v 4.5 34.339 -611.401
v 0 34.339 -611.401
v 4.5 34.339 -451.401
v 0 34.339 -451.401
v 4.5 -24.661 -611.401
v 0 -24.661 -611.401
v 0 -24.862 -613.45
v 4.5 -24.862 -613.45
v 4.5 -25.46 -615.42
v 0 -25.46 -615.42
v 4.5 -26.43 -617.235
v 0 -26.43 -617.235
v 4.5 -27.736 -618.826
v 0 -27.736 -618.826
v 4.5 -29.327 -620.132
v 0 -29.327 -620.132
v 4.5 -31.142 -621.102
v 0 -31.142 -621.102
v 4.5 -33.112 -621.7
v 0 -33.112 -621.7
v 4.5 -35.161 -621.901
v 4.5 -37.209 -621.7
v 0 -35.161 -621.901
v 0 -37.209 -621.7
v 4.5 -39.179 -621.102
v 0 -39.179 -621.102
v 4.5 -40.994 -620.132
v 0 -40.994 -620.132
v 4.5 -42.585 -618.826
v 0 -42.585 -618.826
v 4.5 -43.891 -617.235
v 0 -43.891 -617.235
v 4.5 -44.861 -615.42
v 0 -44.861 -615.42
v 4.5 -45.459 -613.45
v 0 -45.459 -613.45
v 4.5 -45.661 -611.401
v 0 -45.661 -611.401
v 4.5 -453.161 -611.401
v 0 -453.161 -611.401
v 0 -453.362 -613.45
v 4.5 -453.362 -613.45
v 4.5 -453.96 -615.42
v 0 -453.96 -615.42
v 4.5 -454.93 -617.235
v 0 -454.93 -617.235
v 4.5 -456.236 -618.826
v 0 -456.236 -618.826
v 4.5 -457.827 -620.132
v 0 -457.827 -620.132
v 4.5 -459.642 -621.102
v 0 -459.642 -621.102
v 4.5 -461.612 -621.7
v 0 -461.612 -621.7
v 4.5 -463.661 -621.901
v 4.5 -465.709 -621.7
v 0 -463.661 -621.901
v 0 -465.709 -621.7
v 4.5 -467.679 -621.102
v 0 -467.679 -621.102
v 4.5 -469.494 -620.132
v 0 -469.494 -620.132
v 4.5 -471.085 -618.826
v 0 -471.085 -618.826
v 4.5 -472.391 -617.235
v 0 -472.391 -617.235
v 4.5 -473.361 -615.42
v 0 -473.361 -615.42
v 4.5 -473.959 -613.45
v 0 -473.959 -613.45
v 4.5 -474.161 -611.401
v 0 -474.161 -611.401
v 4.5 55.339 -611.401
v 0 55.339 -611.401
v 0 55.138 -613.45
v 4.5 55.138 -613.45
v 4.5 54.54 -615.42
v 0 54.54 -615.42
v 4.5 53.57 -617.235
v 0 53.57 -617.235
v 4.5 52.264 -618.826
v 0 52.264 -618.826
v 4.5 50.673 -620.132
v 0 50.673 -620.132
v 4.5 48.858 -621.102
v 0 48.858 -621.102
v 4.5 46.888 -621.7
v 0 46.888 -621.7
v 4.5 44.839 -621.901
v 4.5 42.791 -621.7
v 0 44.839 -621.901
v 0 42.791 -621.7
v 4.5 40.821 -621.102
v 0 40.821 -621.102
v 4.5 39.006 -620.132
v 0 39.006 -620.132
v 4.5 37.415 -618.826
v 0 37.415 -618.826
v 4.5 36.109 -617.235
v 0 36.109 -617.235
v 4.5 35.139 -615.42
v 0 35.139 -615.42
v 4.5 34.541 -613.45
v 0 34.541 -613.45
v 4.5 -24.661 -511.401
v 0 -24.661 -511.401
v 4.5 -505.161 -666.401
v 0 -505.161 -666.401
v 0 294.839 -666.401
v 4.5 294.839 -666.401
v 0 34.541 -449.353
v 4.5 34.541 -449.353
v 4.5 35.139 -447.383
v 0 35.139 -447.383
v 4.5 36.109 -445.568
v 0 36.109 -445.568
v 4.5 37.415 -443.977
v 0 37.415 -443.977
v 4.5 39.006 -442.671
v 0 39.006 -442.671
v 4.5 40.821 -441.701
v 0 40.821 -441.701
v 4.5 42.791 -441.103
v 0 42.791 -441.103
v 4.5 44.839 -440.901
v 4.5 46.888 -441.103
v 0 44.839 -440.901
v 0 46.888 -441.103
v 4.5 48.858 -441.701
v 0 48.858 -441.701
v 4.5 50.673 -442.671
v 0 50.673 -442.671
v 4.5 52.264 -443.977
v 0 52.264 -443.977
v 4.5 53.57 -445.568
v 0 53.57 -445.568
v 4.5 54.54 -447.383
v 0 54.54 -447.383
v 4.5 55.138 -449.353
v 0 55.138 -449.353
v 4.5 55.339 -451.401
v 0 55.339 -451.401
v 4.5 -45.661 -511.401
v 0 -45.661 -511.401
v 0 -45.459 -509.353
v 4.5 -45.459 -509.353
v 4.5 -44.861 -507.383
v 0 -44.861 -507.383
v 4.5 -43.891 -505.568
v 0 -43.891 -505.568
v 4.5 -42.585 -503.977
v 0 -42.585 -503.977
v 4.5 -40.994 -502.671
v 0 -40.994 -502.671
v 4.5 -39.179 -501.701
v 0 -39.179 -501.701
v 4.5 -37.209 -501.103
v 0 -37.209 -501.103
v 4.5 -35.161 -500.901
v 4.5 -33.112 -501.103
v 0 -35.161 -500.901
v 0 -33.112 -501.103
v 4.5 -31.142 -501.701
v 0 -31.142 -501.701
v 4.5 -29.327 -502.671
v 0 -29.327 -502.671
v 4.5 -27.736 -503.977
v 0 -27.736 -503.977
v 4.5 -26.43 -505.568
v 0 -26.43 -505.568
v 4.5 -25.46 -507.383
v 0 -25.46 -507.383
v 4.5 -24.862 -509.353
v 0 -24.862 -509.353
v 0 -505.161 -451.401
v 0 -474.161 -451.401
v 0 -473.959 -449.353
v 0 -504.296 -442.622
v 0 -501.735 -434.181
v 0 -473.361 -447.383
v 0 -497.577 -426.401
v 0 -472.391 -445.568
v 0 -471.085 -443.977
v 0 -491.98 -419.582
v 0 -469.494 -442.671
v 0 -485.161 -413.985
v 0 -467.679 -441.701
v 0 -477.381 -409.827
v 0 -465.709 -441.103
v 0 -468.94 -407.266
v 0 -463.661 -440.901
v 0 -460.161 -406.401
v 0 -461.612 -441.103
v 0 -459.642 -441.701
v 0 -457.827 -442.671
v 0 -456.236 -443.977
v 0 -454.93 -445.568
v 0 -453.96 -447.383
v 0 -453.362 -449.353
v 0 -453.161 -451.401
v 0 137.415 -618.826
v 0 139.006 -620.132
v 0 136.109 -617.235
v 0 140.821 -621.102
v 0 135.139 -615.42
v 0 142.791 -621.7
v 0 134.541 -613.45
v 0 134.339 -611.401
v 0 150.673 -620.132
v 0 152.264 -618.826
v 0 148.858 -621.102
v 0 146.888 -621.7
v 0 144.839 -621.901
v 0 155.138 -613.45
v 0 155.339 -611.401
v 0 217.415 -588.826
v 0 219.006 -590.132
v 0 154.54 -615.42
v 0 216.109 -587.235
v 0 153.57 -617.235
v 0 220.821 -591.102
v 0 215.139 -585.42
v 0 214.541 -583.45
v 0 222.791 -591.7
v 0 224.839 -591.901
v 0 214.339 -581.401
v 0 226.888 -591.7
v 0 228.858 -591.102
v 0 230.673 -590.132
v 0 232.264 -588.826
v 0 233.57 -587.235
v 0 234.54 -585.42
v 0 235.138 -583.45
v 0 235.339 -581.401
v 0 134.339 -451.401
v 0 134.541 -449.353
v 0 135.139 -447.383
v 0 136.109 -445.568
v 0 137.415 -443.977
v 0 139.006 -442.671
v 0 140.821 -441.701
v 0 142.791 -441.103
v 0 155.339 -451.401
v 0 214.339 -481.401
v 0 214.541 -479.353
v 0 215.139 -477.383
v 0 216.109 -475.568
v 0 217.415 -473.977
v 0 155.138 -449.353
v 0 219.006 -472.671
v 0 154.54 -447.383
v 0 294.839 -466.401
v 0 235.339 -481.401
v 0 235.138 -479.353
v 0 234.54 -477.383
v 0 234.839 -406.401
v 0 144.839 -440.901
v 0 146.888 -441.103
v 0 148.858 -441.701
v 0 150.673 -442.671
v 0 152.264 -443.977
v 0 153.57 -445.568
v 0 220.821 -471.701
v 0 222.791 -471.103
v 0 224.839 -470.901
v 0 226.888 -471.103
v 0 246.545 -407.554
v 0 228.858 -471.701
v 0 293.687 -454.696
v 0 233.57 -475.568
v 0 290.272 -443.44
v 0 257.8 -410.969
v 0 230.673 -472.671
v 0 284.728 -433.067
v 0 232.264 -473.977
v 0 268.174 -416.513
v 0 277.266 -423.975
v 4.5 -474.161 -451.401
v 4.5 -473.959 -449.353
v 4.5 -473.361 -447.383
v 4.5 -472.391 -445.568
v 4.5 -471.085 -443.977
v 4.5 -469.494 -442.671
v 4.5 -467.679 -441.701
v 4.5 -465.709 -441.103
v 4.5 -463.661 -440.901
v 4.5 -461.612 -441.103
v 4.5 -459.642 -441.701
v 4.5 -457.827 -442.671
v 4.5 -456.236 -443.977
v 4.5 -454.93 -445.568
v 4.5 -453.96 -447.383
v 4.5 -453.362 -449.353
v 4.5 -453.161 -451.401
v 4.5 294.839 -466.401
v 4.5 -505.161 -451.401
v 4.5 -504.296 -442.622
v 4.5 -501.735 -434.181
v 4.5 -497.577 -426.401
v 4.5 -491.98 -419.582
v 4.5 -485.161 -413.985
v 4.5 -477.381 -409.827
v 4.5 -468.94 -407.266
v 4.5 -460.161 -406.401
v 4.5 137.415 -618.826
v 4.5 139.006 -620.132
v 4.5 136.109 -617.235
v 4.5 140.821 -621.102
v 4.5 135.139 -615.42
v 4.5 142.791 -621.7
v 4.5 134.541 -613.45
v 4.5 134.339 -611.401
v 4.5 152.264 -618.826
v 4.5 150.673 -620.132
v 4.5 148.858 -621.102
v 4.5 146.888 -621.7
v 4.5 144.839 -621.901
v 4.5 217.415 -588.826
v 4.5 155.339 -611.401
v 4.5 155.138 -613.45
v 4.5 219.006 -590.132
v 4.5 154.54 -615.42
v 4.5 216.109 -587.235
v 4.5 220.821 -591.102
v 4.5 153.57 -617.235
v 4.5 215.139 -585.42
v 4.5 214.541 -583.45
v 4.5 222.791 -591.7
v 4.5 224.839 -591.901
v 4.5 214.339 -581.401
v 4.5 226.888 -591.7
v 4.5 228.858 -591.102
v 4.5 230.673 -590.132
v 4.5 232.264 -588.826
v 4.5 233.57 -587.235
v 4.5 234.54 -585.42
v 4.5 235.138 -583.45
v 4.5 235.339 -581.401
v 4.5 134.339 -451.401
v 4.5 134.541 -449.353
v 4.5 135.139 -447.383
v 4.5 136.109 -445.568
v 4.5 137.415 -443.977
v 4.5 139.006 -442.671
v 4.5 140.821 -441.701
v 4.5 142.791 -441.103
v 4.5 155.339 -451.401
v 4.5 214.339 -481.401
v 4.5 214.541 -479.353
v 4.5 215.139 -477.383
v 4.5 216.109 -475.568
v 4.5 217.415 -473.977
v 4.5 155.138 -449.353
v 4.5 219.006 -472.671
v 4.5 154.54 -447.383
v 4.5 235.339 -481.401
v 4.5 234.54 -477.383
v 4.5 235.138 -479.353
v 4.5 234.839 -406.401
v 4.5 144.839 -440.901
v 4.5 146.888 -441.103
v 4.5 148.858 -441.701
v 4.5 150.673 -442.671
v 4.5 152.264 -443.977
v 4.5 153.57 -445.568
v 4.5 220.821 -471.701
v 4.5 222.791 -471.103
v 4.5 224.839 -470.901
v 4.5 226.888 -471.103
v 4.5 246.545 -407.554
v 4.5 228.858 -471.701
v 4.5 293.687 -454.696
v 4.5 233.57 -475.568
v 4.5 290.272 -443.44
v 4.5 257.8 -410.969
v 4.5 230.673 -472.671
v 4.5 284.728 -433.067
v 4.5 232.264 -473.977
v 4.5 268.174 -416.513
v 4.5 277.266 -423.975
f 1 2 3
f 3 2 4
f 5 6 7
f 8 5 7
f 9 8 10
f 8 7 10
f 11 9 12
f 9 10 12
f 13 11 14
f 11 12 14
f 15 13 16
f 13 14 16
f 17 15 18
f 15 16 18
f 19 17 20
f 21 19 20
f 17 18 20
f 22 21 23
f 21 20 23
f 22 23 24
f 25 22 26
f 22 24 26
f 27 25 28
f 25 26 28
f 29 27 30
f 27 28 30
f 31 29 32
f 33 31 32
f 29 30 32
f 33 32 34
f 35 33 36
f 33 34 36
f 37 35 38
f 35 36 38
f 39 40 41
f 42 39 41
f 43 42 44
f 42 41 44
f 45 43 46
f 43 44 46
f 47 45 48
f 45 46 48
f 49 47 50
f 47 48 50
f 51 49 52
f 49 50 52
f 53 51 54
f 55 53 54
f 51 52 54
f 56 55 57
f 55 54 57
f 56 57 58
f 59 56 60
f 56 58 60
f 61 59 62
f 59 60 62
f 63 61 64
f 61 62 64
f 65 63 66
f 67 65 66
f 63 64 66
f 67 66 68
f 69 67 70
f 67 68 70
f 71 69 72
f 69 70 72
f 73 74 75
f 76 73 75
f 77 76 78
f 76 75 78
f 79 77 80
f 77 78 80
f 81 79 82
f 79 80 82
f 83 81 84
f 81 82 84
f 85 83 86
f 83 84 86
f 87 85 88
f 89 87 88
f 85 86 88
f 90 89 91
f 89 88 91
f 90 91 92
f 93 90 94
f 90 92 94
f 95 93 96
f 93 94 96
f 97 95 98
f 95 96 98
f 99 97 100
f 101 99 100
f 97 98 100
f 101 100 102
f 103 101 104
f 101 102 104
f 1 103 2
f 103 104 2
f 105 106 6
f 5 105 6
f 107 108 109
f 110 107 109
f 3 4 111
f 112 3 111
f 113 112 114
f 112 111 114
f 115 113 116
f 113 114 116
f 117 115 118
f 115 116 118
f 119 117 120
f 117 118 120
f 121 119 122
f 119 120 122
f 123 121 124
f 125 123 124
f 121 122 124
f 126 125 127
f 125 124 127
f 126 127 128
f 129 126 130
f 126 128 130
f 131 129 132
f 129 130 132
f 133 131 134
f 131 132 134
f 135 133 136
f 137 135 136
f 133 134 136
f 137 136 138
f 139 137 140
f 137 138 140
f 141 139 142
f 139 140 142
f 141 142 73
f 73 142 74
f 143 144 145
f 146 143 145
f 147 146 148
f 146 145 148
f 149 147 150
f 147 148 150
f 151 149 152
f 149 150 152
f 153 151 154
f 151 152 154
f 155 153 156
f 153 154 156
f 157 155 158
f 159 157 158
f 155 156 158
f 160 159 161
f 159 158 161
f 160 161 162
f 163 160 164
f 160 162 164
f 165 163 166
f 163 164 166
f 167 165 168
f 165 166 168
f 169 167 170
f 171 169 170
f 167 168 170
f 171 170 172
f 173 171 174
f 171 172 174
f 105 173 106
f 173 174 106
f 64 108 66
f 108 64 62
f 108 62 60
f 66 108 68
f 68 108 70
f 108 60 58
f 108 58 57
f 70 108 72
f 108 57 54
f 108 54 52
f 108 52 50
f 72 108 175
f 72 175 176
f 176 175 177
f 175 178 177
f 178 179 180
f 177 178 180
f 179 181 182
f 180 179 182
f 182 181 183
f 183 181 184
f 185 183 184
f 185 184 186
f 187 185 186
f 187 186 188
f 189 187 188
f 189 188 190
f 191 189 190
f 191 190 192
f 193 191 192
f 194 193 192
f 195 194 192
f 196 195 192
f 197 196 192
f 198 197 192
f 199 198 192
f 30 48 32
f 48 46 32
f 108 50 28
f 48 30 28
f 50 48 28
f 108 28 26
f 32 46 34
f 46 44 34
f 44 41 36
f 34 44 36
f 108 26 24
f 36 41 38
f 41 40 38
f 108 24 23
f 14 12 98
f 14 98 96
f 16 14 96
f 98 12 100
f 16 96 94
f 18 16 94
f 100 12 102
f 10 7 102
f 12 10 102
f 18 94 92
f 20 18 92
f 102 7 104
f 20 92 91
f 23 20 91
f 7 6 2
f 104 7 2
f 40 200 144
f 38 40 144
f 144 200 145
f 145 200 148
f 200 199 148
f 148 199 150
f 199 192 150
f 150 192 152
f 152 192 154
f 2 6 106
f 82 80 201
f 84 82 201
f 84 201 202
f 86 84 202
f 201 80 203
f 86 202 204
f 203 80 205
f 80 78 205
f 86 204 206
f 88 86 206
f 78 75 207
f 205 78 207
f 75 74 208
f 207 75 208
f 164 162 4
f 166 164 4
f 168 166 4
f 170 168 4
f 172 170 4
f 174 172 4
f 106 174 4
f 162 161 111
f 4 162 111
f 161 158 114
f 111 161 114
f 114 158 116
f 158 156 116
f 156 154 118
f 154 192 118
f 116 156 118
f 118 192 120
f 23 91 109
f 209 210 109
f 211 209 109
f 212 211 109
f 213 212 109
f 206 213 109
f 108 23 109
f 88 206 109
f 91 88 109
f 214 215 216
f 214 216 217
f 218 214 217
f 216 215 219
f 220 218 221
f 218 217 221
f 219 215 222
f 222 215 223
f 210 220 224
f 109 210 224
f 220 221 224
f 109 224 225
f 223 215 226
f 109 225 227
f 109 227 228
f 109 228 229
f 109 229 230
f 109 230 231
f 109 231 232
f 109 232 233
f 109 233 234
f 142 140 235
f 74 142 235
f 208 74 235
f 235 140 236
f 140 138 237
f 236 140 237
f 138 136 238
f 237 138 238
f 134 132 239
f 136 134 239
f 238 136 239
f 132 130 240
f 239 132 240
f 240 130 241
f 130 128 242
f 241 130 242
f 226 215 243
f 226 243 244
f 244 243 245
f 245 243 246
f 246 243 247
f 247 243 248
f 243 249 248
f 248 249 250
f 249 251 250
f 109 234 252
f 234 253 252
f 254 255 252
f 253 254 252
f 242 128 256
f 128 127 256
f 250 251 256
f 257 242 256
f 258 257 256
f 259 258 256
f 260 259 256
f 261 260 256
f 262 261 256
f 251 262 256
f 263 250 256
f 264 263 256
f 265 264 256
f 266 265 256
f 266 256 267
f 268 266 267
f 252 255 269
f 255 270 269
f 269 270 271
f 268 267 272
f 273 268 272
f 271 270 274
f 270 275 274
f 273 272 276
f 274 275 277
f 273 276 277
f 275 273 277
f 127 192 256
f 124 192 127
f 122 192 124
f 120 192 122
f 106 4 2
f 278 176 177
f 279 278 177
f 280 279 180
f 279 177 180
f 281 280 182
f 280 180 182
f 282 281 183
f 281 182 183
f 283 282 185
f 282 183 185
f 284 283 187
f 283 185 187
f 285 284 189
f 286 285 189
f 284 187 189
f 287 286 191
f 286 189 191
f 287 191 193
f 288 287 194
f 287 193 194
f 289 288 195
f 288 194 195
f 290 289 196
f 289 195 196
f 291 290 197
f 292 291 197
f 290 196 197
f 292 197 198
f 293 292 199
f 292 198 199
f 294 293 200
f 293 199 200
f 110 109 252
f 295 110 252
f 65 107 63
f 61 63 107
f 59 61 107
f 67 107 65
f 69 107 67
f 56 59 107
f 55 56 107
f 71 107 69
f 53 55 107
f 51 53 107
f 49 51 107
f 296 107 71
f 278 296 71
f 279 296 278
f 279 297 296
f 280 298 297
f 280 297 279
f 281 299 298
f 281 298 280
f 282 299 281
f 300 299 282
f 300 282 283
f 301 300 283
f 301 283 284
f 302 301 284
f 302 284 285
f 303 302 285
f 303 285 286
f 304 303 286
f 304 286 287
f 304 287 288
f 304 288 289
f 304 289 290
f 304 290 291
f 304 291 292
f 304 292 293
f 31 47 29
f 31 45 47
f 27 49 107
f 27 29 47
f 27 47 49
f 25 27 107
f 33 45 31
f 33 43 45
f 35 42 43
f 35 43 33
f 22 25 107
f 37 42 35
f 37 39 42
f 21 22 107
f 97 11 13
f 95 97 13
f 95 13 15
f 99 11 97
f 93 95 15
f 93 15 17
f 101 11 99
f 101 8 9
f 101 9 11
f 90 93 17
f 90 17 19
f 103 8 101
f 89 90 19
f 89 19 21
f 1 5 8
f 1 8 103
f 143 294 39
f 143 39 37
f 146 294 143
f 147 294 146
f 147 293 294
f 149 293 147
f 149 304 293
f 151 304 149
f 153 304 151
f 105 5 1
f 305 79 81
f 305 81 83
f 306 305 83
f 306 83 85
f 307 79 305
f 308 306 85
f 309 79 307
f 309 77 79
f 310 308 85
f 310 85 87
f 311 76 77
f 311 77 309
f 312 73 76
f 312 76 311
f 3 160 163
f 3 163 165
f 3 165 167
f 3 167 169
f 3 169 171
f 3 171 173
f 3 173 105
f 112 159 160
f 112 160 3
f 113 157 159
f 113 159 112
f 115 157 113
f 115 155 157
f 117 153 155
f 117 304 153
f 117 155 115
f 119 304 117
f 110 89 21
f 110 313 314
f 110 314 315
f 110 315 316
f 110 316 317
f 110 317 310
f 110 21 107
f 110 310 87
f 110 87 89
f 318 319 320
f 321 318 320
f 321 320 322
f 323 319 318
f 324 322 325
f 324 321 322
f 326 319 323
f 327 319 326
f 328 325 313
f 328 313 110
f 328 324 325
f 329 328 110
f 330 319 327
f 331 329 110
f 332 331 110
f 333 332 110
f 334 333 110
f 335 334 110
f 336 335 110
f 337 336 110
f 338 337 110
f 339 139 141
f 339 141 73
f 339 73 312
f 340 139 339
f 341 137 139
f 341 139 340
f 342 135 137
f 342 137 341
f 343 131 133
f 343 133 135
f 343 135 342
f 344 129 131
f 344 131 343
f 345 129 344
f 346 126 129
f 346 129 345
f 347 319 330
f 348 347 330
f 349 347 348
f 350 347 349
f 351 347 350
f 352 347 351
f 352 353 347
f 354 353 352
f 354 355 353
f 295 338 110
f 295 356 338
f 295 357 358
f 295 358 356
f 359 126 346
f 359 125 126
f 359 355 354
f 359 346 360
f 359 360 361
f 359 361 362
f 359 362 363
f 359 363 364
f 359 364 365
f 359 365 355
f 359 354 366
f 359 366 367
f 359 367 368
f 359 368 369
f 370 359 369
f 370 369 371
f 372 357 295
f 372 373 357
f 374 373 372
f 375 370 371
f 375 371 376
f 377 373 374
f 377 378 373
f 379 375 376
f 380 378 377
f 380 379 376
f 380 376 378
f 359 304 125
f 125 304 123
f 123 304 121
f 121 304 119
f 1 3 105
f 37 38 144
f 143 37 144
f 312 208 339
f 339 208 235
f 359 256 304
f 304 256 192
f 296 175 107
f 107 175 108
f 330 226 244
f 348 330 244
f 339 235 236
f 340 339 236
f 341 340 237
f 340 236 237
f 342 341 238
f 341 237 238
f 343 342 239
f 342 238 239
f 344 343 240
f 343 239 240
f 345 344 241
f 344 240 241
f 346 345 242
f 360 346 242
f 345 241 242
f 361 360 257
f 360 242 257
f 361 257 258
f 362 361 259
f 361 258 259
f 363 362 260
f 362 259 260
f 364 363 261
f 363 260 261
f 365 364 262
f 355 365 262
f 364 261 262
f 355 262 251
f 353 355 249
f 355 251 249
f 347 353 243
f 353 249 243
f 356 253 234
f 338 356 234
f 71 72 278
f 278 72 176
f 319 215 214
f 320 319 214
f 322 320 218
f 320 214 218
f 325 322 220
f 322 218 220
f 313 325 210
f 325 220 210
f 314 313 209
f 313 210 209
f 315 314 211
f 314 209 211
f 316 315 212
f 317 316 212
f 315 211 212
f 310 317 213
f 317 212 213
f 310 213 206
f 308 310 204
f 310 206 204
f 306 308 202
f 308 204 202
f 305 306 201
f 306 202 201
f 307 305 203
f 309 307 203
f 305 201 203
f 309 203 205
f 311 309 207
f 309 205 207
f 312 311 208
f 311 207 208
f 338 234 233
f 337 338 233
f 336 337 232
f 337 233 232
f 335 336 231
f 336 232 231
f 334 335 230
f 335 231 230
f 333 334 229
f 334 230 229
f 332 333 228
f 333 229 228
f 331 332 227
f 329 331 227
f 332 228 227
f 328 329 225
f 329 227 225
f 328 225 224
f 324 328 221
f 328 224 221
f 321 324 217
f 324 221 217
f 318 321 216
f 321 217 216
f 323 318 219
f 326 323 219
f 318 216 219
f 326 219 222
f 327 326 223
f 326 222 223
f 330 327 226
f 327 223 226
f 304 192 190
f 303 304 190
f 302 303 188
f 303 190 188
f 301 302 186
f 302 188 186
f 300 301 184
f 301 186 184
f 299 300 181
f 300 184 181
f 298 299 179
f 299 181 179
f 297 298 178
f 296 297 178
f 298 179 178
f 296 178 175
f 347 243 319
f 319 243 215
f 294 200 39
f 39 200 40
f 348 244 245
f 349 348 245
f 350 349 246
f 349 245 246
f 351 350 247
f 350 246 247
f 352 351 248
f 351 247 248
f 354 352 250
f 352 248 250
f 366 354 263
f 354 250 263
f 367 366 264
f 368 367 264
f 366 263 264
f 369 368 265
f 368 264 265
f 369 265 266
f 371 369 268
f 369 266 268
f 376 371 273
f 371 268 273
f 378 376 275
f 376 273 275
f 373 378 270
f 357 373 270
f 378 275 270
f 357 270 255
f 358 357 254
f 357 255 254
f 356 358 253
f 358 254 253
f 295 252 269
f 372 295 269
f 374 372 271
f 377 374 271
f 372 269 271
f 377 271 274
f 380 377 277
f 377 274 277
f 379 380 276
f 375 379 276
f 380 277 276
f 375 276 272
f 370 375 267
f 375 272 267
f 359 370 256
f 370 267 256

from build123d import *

# Parameters (mm, degrees)
F1_DEPTH = 4.5


# Not quite as in the source:
# - a feature names something its author has since deleted; it is built from what else it names


with BuildPart() as f1:
    # F0 (on Right) → F1 (new body)
    with BuildSketch(Plane.YZ):
        with BuildLine():
            Line((-100, -666.4014723765), (294.8394132124, -666.4014723765))
            Line((294.8394132124, -666.4014723765), (294.8394132124, -466.4014723765))
            ThreePointArc((294.8394132124, -466.4014723765), (277.2658200836, -423.9750655053), (234.8394132124, -406.4014723765))
            Line((234.8394132124, -406.4014723765), (-460.1605867876, -406.4014723765))
            ThreePointArc((-460.1605867876, -406.4014723765), (-491.980391941, -419.5816672231), (-505.1605867876, -451.4014723765))
            Line((-505.1605867876, -451.4014723765), (-505.1605867876, -666.4014723765))
            Line((-505.1605867876, -666.4014723765), (-100, -666.4014723765))
        make_face()
        with BuildLine():
            ThreePointArc((-24.6605867876, -611.4014723765), (-35.1605867876, -621.9014723765), (-45.6605867876, -611.4014723765))
            Line((-45.6605867876, -611.4014723765), (-45.6605867876, -511.4014723765))
            ThreePointArc((-45.6605867876, -511.4014723765), (-35.1605867876, -500.9014723765), (-24.6605867876, -511.4014723765))
            Line((-24.6605867876, -511.4014723765), (-24.6605867876, -611.4014723765))
        make_face(mode=Mode.SUBTRACT)
        with BuildLine():
            ThreePointArc((-453.1605867876, -611.4014723765), (-463.6605867876, -621.9014723765), (-474.1605867876, -611.4014723765))
            Line((-474.1605867876, -611.4014723765), (-474.1605867876, -451.4014723765))
            ThreePointArc((-474.1605867876, -451.4014723765), (-463.6605867876, -440.9014723765), (-453.1605867876, -451.4014723765))
            Line((-453.1605867876, -451.4014723765), (-453.1605867876, -611.4014723765))
        make_face(mode=Mode.SUBTRACT)
        with BuildLine():
            Line((34.3394132124, -611.4014723765), (34.3394132124, -451.4014723765))
            ThreePointArc((34.3394132124, -451.4014723765), (44.8394132124, -440.9014723765), (55.3394132124, -451.4014723765))
            Line((55.3394132124, -451.4014723765), (55.3394132124, -611.4014723765))
            ThreePointArc((55.3394132124, -611.4014723765), (44.8394132124, -621.9014723765), (34.3394132124, -611.4014723765))
        make_face(mode=Mode.SUBTRACT)
        with BuildLine():
            Line((134.3394132124, -611.4014723765), (134.3394132124, -451.4014723765))
            ThreePointArc((134.3394132124, -451.4014723765), (144.8394132124, -440.9014723765), (155.3394132124, -451.4014723765))
            Line((155.3394132124, -451.4014723765), (155.3394132124, -611.4014723765))
            ThreePointArc((155.3394132124, -611.4014723765), (144.8394132124, -621.9014723765), (134.3394132124, -611.4014723765))
        make_face(mode=Mode.SUBTRACT)
        with BuildLine():
            ThreePointArc((235.3394132124, -581.4014723765), (224.8394132124, -591.9014723765), (214.3394132124, -581.4014723765))
            Line((214.3394132124, -581.4014723765), (214.3394132124, -481.4014723765))
            ThreePointArc((214.3394132124, -481.4014723765), (224.8394132124, -470.9014723765), (235.3394132124, -481.4014723765))
            Line((235.3394132124, -481.4014723765), (235.3394132124, -581.4014723765))
        make_face(mode=Mode.SUBTRACT)
    extrude(amount=F1_DEPTH)


solid = f1.part
